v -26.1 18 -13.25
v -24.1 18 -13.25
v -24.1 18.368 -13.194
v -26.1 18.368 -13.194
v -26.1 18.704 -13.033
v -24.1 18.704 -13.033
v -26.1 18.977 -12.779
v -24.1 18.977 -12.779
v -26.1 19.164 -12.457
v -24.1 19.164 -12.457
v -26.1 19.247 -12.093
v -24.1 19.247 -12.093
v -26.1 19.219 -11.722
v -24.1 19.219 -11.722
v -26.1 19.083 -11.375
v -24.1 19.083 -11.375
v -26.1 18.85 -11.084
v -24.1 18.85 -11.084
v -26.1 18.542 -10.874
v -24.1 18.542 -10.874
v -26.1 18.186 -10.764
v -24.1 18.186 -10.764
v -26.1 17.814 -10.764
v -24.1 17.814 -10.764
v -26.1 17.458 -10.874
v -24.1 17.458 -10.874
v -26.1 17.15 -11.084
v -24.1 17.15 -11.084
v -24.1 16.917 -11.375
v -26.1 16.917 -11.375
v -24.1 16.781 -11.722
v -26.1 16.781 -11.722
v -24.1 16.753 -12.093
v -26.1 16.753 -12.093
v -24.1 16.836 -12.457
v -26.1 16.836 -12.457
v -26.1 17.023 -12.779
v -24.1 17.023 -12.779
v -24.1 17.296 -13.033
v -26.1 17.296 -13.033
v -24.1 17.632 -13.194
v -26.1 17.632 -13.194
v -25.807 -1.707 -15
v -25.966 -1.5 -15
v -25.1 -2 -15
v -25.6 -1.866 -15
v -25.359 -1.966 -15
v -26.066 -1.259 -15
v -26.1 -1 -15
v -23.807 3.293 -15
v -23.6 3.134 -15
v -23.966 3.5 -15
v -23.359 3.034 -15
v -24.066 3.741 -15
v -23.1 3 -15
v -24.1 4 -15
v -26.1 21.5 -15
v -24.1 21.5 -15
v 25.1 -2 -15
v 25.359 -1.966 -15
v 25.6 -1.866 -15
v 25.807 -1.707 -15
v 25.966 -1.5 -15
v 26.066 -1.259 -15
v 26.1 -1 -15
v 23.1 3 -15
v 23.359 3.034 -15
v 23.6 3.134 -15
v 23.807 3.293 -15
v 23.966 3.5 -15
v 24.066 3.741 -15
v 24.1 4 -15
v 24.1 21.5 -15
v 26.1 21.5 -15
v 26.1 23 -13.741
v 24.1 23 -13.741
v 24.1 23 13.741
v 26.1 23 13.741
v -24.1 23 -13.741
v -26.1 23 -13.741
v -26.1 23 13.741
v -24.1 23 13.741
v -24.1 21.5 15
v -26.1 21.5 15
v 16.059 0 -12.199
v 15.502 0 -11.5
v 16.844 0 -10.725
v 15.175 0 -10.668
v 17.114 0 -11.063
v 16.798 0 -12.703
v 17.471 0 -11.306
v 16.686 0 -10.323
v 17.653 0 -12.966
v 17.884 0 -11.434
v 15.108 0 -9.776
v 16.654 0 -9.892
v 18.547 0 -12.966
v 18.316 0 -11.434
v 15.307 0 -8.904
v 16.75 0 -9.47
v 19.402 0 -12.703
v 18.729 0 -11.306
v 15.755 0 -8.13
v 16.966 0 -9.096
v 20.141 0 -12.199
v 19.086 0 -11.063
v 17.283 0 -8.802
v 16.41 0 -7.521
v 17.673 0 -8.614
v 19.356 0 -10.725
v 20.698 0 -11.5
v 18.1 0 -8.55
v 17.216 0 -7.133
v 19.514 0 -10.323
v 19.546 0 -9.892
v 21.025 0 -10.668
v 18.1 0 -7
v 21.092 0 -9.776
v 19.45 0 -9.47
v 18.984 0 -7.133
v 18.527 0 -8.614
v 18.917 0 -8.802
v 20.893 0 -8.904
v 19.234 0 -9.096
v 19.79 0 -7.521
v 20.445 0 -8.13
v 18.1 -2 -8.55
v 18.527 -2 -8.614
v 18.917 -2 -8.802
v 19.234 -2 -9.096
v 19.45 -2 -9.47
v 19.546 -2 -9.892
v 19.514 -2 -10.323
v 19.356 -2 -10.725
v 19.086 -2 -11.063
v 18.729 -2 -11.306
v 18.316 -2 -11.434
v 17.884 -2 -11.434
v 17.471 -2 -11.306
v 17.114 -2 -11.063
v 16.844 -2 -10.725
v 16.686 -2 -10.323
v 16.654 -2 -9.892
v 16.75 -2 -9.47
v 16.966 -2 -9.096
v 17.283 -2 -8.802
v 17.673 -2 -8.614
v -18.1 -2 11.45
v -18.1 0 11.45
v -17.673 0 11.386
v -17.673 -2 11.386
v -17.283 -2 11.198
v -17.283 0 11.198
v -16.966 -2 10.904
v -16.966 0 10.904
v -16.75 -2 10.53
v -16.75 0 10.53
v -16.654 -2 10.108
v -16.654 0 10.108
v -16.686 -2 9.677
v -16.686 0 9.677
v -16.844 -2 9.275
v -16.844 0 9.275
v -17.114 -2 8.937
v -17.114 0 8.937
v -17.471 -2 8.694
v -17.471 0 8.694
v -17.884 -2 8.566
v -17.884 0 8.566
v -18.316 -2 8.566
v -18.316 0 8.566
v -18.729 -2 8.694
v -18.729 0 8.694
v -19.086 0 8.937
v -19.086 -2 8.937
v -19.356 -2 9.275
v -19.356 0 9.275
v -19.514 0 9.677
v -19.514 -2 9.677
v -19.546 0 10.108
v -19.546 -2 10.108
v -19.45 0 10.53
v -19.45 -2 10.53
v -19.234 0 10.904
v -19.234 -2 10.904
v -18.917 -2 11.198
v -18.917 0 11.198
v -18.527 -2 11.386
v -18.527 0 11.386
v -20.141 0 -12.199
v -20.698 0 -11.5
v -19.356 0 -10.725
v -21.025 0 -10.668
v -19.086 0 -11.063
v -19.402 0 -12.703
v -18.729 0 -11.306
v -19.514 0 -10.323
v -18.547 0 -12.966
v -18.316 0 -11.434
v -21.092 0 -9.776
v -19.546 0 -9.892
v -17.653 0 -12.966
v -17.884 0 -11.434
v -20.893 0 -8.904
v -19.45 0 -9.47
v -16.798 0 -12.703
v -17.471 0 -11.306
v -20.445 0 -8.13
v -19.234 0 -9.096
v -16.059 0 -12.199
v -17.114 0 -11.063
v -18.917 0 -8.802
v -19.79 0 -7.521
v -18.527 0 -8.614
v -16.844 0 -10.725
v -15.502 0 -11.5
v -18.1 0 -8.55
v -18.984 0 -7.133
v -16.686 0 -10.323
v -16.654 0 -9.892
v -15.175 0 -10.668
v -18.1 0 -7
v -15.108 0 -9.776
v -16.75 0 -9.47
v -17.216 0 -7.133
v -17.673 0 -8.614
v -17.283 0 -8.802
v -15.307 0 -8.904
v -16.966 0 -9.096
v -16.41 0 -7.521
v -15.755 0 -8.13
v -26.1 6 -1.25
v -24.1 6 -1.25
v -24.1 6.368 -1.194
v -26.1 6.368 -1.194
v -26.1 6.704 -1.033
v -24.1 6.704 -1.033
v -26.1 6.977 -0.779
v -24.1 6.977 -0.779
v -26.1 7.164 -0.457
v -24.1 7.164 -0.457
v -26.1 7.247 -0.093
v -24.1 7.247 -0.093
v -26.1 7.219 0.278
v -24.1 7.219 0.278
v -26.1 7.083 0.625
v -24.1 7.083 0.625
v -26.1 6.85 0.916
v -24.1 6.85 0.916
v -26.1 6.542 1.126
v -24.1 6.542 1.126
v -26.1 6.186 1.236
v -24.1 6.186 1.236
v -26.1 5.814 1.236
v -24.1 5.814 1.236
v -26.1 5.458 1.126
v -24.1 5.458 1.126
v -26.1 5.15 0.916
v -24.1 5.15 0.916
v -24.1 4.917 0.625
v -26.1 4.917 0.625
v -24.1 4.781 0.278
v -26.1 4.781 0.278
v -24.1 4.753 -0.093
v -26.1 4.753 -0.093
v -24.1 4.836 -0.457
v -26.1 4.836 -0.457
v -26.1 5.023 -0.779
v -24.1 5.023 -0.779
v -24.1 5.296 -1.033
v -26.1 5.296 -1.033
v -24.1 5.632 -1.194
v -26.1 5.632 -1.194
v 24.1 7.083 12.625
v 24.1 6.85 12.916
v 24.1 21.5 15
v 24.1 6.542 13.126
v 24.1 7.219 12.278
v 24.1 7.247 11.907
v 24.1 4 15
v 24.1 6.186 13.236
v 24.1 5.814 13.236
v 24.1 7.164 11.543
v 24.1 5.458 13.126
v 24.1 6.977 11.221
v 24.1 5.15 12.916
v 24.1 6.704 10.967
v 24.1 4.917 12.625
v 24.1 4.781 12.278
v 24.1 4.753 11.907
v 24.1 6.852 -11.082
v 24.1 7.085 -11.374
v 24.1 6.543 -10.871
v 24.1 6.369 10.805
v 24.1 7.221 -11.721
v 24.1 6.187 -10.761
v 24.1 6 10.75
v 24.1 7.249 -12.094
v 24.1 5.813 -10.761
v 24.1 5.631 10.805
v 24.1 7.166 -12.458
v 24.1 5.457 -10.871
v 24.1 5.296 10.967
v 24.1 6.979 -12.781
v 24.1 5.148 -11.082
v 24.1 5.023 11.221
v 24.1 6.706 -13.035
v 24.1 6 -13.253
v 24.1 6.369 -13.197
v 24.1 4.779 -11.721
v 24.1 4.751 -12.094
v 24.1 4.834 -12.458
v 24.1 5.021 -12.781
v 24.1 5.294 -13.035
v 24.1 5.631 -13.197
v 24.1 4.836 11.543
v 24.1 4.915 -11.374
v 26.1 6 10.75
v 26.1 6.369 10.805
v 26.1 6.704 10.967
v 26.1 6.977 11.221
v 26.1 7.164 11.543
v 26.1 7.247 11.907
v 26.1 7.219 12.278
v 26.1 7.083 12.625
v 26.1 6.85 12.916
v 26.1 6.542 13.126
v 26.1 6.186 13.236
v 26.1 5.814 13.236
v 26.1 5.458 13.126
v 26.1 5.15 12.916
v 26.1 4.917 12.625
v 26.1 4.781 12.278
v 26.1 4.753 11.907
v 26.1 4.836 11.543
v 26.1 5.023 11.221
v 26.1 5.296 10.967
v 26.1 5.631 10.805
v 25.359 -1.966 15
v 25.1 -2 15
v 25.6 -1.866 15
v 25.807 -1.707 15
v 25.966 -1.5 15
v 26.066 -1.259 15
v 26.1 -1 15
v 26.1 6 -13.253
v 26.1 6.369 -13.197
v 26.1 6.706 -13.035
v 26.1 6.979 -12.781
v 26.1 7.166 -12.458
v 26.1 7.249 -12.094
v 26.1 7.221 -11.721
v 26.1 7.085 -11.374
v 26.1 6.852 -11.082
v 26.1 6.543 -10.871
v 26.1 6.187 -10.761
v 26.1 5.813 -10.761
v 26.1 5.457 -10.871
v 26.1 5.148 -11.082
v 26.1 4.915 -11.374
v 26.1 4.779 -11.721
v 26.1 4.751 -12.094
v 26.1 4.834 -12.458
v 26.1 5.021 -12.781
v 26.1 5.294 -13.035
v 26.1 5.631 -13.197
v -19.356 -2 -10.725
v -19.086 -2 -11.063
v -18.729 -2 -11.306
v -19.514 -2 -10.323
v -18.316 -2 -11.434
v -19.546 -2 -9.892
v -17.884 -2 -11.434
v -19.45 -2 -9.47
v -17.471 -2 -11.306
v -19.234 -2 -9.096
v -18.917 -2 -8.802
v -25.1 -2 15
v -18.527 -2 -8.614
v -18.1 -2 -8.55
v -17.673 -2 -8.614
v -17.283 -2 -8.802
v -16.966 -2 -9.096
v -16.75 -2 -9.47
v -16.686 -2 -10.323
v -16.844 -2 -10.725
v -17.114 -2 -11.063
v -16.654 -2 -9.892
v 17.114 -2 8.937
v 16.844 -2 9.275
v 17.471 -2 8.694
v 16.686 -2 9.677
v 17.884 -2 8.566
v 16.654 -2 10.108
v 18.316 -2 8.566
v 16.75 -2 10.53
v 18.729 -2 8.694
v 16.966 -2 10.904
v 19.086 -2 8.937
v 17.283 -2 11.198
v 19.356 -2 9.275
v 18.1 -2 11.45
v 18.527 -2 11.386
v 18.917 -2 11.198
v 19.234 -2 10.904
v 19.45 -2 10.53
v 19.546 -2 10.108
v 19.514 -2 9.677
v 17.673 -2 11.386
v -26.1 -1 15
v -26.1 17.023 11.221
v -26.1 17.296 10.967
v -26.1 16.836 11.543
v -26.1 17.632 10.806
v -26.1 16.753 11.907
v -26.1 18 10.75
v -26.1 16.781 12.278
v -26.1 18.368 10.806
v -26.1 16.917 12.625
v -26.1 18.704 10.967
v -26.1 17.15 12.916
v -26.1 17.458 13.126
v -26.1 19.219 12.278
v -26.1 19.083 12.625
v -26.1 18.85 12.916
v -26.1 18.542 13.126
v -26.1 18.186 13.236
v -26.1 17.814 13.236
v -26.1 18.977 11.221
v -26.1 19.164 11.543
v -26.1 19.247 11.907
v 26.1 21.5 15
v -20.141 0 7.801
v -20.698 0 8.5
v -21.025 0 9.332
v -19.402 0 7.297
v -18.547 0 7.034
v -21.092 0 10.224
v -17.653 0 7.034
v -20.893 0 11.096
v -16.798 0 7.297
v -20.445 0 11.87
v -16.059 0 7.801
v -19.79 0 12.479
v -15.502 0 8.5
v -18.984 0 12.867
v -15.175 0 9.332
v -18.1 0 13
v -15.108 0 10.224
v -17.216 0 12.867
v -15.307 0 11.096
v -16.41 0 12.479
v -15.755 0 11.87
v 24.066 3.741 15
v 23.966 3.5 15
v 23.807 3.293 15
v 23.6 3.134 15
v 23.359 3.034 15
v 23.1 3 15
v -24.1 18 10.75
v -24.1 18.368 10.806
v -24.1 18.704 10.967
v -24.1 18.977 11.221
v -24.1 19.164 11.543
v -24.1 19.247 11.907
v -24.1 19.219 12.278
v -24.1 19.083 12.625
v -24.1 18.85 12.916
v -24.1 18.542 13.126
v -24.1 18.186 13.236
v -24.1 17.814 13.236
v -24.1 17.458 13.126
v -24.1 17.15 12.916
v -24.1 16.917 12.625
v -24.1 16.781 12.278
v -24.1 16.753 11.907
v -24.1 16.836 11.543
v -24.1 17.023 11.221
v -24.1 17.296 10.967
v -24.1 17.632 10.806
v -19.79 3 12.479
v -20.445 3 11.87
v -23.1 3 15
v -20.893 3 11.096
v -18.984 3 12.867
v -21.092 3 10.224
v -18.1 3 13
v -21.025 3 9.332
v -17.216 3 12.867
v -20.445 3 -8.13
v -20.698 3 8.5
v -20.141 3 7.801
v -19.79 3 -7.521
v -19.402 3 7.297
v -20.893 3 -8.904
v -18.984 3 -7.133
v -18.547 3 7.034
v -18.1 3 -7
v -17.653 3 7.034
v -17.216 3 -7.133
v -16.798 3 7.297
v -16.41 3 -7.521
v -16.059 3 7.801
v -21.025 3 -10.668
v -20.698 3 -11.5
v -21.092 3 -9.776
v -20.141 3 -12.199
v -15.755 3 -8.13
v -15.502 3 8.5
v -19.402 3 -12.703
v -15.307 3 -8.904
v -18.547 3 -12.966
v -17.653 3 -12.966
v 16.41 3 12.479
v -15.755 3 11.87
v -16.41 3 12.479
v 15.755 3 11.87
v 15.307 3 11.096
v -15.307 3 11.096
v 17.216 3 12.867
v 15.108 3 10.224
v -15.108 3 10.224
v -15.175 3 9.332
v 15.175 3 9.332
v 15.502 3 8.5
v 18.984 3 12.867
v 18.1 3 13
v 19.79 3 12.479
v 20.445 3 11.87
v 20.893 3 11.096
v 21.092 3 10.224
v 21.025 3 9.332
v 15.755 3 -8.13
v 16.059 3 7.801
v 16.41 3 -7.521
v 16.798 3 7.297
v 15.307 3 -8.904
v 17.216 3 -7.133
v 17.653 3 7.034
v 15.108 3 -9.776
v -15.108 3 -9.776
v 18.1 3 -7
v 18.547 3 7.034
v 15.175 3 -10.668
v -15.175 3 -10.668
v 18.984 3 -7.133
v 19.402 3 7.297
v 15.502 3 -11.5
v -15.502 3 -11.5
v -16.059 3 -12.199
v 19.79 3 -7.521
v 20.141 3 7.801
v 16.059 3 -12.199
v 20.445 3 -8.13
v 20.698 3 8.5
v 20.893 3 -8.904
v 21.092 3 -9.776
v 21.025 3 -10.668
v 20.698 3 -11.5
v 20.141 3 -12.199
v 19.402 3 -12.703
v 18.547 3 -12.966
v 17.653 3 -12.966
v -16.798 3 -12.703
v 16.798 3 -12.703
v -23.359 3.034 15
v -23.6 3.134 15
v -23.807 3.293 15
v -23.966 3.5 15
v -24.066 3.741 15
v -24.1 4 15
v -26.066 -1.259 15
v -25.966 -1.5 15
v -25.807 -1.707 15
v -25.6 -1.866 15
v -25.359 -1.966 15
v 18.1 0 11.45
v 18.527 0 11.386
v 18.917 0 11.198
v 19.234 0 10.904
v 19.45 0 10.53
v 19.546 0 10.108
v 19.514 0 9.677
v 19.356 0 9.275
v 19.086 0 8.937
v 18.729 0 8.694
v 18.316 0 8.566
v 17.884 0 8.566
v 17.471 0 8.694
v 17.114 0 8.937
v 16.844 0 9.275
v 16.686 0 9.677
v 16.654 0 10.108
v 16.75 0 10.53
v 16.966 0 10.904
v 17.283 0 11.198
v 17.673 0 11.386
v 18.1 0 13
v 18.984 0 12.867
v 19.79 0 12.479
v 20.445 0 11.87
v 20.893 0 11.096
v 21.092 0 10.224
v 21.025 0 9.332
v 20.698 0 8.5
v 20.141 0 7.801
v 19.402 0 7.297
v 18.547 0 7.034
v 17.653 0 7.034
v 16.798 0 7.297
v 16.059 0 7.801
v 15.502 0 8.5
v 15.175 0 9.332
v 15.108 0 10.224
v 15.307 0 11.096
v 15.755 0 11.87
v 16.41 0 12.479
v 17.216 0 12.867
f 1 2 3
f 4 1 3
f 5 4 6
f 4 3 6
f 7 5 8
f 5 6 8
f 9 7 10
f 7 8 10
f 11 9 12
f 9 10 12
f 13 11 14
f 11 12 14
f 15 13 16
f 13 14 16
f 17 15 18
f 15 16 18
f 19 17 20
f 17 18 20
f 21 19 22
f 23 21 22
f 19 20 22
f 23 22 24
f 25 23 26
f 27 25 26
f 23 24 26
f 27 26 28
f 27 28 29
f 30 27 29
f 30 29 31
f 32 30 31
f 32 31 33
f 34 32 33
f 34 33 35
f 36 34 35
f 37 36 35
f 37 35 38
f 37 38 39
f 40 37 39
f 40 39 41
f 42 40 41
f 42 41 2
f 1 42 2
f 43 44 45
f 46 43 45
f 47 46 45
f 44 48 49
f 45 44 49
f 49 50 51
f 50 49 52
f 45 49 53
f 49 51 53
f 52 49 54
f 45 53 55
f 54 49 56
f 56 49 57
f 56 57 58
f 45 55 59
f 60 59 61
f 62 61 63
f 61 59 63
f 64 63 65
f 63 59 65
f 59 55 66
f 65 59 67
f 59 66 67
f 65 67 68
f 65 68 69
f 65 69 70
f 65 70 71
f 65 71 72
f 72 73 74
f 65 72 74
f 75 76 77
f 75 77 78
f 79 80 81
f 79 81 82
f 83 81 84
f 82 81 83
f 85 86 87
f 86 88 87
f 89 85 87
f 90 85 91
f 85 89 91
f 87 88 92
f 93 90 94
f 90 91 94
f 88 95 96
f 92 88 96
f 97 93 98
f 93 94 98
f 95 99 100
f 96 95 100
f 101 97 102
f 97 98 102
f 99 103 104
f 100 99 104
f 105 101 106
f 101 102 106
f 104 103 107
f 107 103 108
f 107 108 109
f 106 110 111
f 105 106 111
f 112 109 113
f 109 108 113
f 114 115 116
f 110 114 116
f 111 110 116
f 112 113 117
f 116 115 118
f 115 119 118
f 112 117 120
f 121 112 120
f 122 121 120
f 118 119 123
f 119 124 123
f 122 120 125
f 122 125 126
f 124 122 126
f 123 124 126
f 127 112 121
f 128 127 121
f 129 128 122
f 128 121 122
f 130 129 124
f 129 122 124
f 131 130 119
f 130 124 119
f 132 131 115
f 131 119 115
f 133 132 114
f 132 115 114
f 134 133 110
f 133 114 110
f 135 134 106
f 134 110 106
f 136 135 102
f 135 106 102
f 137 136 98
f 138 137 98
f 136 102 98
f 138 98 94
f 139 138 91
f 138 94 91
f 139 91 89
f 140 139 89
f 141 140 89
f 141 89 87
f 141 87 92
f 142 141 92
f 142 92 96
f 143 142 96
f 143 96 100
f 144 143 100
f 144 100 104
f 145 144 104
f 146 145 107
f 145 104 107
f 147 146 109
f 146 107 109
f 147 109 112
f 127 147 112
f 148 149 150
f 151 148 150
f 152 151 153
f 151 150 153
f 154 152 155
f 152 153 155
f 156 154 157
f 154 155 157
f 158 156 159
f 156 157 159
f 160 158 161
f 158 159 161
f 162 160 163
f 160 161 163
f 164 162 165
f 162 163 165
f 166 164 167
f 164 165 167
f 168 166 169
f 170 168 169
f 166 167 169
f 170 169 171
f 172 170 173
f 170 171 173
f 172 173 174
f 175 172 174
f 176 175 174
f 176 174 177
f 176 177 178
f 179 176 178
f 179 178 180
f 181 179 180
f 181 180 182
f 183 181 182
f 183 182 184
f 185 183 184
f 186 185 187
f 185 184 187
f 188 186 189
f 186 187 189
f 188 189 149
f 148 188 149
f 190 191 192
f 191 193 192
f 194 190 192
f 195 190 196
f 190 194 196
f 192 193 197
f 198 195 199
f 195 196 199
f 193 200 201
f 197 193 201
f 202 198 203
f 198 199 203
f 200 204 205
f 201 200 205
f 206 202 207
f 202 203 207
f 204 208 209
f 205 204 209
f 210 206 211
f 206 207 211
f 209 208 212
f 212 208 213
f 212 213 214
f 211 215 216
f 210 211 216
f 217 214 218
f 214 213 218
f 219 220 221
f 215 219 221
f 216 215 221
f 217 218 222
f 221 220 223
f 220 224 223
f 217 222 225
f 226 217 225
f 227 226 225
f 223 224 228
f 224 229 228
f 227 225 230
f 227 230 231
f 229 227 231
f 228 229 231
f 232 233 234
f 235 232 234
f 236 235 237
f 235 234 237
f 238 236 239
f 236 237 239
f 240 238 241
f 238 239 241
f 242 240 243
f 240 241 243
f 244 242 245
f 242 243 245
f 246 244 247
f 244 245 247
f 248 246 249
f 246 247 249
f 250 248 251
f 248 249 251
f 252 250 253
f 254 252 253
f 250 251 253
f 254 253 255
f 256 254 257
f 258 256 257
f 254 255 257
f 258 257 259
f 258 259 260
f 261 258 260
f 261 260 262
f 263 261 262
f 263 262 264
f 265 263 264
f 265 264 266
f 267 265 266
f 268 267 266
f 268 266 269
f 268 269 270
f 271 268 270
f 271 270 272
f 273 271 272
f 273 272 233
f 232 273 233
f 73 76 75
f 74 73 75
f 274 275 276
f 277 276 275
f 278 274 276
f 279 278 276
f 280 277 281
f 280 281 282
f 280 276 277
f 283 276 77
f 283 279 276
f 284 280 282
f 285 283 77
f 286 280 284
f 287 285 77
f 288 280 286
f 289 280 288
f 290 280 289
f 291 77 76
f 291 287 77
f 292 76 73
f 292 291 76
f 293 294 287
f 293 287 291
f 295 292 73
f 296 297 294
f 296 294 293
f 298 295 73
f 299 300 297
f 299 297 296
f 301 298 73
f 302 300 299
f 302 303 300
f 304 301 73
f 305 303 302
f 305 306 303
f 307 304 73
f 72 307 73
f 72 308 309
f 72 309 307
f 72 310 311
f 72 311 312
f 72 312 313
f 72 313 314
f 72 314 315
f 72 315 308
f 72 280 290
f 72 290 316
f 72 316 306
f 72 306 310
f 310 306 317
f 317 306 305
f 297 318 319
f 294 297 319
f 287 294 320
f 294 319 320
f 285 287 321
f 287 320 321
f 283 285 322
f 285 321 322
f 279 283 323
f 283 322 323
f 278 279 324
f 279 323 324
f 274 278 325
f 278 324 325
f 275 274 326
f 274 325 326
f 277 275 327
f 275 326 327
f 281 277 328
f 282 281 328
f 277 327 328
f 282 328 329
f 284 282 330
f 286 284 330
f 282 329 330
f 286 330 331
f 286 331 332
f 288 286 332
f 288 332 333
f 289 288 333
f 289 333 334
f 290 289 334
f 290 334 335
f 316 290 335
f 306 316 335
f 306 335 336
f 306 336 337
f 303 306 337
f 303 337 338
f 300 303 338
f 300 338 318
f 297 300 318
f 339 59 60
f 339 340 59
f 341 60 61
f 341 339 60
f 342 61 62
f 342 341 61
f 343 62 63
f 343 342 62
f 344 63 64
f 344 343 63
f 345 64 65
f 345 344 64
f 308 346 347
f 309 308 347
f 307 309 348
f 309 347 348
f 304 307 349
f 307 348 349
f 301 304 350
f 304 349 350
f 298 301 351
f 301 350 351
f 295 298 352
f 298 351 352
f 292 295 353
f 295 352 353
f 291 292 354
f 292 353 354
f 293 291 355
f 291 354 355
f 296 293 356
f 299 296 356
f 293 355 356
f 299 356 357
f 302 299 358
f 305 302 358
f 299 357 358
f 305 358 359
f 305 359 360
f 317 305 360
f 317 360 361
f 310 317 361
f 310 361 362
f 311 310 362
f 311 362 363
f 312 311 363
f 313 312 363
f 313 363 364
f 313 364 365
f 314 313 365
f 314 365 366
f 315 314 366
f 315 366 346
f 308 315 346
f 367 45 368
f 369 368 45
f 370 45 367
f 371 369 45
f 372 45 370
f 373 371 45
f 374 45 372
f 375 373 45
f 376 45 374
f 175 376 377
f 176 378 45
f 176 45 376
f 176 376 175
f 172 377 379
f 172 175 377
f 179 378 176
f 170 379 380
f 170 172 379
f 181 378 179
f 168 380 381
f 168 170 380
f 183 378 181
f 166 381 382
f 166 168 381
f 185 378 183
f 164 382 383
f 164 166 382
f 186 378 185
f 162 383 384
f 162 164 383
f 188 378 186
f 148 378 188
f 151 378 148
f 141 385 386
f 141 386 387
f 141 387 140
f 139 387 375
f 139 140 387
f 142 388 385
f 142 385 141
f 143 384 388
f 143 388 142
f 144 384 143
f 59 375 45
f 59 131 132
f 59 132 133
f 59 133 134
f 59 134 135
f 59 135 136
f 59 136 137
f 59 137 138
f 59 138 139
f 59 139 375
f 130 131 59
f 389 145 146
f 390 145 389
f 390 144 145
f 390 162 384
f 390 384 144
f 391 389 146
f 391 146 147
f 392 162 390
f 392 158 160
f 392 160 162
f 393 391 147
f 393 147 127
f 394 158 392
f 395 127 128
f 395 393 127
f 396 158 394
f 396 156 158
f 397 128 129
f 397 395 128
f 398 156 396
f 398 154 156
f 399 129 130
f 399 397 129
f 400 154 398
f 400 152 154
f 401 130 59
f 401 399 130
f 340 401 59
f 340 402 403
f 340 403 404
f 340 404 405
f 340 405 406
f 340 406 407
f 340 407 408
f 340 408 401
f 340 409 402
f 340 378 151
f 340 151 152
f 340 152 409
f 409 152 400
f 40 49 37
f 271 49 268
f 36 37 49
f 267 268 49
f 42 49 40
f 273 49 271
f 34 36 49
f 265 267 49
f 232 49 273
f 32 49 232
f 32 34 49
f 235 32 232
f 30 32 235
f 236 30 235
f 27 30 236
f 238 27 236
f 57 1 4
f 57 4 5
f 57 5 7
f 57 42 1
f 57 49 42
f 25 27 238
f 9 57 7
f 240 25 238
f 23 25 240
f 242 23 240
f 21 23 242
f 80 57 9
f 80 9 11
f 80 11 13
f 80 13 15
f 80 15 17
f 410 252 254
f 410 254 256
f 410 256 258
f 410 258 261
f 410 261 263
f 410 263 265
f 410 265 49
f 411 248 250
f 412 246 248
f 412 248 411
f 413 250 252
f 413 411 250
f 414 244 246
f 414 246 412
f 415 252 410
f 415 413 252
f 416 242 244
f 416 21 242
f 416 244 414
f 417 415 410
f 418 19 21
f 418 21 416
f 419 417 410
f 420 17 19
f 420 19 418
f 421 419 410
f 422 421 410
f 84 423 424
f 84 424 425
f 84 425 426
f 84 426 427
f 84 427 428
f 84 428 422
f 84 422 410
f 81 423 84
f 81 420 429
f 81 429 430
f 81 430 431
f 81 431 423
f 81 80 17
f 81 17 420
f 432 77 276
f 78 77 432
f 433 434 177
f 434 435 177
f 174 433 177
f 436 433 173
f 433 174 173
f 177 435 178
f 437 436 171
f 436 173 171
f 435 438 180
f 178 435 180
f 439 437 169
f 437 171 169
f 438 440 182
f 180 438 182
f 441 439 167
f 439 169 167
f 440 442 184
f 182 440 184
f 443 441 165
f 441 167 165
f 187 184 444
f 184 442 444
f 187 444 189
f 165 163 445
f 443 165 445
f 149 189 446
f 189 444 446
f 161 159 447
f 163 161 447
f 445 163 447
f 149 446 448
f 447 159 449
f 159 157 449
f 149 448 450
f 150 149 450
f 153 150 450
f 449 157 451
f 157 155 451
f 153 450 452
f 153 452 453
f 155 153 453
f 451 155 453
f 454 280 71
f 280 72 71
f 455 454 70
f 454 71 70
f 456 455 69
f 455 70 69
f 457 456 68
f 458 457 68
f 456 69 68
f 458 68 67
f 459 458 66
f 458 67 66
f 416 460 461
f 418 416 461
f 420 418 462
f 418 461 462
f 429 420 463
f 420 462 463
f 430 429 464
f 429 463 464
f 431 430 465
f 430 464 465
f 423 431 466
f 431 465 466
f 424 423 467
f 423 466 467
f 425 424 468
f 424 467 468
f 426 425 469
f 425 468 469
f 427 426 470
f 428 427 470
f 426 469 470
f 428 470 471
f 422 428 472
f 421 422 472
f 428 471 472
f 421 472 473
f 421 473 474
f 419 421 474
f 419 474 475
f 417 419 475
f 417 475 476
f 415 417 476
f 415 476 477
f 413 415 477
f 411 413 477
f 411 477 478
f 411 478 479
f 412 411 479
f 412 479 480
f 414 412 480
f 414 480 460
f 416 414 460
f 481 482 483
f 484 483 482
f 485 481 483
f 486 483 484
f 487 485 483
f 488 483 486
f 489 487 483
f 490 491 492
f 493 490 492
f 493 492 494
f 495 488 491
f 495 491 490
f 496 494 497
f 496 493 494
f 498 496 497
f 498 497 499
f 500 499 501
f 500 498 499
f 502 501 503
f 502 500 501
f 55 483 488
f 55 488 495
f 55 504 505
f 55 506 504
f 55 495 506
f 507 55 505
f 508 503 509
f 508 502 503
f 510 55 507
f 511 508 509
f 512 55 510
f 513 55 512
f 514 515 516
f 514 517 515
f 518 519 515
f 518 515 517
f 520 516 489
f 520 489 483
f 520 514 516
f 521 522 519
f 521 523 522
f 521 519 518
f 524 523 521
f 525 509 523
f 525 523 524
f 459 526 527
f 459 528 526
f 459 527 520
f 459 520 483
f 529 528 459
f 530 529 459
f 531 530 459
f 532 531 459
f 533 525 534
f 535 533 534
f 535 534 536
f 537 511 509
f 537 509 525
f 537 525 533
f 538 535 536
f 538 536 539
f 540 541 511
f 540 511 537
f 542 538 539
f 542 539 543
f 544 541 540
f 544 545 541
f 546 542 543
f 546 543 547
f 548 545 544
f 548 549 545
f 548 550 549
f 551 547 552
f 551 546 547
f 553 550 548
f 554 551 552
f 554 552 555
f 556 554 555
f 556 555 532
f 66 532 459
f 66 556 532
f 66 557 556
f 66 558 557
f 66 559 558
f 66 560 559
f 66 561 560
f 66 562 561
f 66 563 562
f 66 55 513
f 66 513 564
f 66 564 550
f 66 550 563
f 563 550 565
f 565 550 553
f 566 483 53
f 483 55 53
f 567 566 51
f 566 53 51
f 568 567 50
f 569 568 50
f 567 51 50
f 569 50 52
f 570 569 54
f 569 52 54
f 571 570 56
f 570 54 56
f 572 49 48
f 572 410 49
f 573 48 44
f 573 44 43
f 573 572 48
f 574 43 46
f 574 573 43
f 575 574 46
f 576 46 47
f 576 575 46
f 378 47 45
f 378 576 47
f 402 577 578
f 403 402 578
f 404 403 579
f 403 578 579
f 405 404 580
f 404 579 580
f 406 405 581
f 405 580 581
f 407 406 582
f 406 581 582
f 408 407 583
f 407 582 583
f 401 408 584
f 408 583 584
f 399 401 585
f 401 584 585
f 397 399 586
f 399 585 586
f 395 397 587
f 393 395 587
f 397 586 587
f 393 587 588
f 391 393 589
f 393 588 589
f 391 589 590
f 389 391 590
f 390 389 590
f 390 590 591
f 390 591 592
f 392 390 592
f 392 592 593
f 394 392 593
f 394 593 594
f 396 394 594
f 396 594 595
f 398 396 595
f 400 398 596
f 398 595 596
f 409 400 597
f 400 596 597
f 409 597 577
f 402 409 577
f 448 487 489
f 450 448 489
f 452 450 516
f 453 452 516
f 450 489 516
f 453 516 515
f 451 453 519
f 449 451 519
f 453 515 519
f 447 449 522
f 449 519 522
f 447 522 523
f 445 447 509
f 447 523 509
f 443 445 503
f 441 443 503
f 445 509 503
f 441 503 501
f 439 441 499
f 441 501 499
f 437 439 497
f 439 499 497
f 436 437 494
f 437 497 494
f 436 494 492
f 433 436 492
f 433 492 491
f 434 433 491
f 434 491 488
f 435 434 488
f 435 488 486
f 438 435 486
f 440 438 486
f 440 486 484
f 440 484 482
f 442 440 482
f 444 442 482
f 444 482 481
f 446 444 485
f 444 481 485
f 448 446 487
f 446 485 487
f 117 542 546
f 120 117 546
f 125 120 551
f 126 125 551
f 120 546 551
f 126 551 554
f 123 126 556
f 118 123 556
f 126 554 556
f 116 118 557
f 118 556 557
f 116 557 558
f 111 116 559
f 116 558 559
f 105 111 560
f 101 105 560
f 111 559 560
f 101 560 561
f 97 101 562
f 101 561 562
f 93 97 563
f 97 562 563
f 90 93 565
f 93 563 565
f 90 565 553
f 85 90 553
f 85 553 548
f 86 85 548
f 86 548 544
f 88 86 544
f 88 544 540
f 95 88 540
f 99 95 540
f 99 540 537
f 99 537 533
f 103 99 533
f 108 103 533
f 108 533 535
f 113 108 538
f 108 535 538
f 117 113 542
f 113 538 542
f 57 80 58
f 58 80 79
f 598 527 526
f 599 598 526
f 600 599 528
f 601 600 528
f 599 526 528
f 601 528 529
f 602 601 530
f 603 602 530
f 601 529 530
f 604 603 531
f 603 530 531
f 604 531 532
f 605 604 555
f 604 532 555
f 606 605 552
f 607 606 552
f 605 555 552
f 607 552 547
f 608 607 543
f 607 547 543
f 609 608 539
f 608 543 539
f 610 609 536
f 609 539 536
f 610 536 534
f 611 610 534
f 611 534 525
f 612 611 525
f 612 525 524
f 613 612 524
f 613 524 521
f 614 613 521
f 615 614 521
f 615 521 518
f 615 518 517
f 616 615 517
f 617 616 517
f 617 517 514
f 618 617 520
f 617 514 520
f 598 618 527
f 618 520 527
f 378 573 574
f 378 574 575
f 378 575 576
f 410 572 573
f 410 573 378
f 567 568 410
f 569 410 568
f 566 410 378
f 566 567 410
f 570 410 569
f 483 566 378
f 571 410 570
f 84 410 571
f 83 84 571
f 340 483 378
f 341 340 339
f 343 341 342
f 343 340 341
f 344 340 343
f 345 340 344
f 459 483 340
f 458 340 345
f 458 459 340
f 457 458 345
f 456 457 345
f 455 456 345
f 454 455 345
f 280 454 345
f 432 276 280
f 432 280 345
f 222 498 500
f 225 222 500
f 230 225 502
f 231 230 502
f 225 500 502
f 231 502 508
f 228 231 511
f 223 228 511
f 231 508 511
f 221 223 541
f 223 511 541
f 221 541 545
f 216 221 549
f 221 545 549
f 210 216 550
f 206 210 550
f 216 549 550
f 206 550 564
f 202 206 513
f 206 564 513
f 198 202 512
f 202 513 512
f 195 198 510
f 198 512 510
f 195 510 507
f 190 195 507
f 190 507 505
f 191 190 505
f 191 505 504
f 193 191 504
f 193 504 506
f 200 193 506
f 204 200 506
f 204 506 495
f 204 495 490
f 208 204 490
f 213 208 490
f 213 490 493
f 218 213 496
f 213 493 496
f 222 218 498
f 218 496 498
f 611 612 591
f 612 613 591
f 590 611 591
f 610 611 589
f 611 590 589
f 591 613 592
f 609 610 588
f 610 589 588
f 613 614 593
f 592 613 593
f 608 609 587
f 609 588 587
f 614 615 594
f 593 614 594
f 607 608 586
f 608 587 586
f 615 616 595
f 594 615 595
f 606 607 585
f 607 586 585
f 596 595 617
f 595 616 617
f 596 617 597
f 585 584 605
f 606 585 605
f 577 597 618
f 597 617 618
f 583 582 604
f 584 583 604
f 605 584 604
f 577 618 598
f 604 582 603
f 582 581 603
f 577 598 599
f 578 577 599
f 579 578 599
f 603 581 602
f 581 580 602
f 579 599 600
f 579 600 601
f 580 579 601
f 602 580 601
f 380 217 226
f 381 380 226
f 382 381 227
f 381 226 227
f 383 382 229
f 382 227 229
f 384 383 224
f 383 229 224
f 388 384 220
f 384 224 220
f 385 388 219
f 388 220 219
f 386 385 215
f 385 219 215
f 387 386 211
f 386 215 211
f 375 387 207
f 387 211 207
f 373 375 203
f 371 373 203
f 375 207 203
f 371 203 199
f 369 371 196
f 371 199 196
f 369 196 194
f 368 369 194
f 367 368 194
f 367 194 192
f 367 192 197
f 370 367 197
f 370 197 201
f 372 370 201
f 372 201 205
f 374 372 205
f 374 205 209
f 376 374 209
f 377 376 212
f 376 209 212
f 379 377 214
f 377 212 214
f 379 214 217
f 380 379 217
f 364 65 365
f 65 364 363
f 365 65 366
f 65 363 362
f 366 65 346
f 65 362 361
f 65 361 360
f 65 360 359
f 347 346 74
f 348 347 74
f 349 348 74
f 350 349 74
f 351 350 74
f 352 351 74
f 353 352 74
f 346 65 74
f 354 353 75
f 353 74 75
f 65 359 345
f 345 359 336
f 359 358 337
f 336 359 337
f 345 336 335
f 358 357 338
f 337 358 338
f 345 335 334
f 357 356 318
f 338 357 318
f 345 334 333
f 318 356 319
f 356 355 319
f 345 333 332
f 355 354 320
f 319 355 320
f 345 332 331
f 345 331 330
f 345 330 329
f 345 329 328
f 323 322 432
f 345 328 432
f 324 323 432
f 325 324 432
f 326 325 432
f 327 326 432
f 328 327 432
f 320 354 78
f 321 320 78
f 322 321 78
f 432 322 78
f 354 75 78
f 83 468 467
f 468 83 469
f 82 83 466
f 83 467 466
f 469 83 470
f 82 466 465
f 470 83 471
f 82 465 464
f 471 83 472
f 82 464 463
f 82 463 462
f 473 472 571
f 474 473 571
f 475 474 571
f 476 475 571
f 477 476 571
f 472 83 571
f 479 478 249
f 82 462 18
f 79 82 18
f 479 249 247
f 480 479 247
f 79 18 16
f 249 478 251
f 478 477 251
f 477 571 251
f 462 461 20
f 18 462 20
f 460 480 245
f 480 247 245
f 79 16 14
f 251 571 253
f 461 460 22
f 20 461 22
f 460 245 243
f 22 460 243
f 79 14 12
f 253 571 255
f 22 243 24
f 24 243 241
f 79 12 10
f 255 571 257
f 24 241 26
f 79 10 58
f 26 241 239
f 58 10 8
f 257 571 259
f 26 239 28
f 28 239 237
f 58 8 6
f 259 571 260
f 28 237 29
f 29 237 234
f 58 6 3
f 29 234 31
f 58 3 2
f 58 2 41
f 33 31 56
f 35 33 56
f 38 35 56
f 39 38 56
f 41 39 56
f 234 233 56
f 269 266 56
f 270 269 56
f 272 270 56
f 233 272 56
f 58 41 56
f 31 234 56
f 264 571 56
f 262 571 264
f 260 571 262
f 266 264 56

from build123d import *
from OCP.BRepFilletAPI import BRepFilletAPI_MakeChamfer

# Parameters (mm, degrees)
SKETCH1_W           = 52.2
SKETCH1_H           = 30
BOSS_EXTRUDE1_DEPTH = 3
SKETCH2_W           = 2
SKETCH2_H           = 30
BOSS_EXTRUDE2_DEPTH = 20
SKETCH3_W           = 2
SKETCH3_H           = 30
BOSS_EXTRUDE3_DEPTH = 20
SKETCH4_R           = 1.252611376
SKETCH4_R_2         = 1.250208487
CUT_EXTRUDE2_DEPTH  = 5
SKETCH5_R           = 1.25
SKETCH5_R_2         = 1.249999994
CUT_EXTRUDE4_DEPTH  = 5
SKETCH6_R           = 3
CUT_EXTRUDE5_DEPTH  = 3
SKETCH7_W           = 52.2
SKETCH7_H           = 30
BOSS_EXTRUDE4_DEPTH = 2
SKETCH8_R           = 1.45
CUT_EXTRUDE6_DEPTH  = 2
FILLET1_R           = 1
CHAMFER2_SIZE       = 1.5
CHAMFER2_SIZE2      = 1.258649447


with BuildPart() as part:
    # Sketch1 → Boss-Extrude1 (new body)
    with BuildSketch(Plane(origin=(0, 0, 0), x_dir=(1, 0, 0), z_dir=(0, 1, 0))):
        Rectangle(SKETCH1_W, SKETCH1_H)
    extrude(amount=BOSS_EXTRUDE1_DEPTH)

    # Sketch2 → Boss-Extrude2 (add)
    with BuildSketch(Plane(origin=(0, 3, 0), x_dir=(1, 0, 0), z_dir=(0, 1, 0))):
        with Locations((-25.1, 0)):
            Rectangle(SKETCH2_W, SKETCH2_H)
    extrude(amount=BOSS_EXTRUDE2_DEPTH)

    # Sketch3 → Boss-Extrude3 (add)
    with BuildSketch(Plane(origin=(0, 3, 0), x_dir=(1, 0, 0), z_dir=(0, 1, 0))):
        with Locations((25.1, 0)):
            Rectangle(SKETCH3_W, SKETCH3_H)
    extrude(amount=BOSS_EXTRUDE3_DEPTH)

    # Sketch4 → Cut-Extrude2 (cut)
    with BuildSketch(Plane(origin=(26.1, 0, 0), x_dir=(0, 0, -1), z_dir=(1, 0, 0))):
        with Locations((12, 6)):
            Circle(SKETCH4_R)
        with Locations((-12, 6)):
            Circle(SKETCH4_R_2)
    extrude(amount=-CUT_EXTRUDE2_DEPTH, mode=Mode.SUBTRACT)

    # Sketch5 → Cut-Extrude4 (cut)
    with BuildSketch(Plane(origin=(-24.1, 0, 0), x_dir=(0, 0, -1), z_dir=(1, 0, 0))):
        with Locations((-12.00000002, 18)):
            Circle(SKETCH5_R)
        with Locations((12.00000002, 18)):
            Circle(SKETCH5_R)
        with Locations((0, 6)):
            Circle(SKETCH5_R_2)
    extrude(amount=-CUT_EXTRUDE4_DEPTH, mode=Mode.SUBTRACT)

    # Sketch6 → Cut-Extrude5 (cut)
    with BuildSketch(Plane(origin=(0, 3, 0), x_dir=(1, 0, 0), z_dir=(0, 1, 0))):
        with Locations(Location((-18.1, 10, 0), (0, 0, 270))):
            Circle(SKETCH6_R)
        with Locations(Location((-18.1, -10, 0), (0, 0, 270))):
            Circle(SKETCH6_R)
        with Locations(Location((18.1, 10, 0), (0, 0, 270))):
            Circle(SKETCH6_R)
        with Locations(Location((18.1, -10, 0), (0, 0, 270))):
            Circle(SKETCH6_R)
    extrude(amount=-CUT_EXTRUDE5_DEPTH, mode=Mode.SUBTRACT)

    # Sketch7 → Boss-Extrude4 (add)
    with BuildSketch(Plane.XZ):
        Rectangle(SKETCH7_W, SKETCH7_H)
    extrude(amount=BOSS_EXTRUDE4_DEPTH)

    # Sketch8 → Cut-Extrude6 (cut)
    with BuildSketch(Plane(origin=(0, 0, 0), x_dir=(1, 0, 0), z_dir=(0, 1, 0))):
        with Locations(Location((-18.1, 10, 0), (0, 0, 270))):
            Circle(SKETCH8_R)
        with Locations(Location((18.1, 10, 0), (0, 0, 270))):
            Circle(SKETCH8_R)
        with Locations(Location((18.1, -10, 0), (0, 0, 270))):
            Circle(SKETCH8_R)
        with Locations(Location((-18.1, -10, 0), (0, 0, 270))):
            Circle(SKETCH8_R)
    extrude(amount=-CUT_EXTRUDE6_DEPTH, mode=Mode.SUBTRACT)

    # Fillet1
    fillet1_edges = [part.edges().sort_by_distance(p)[0] for p in [
        (-24.1, 3, 0),
        (24.1, 3, 0),
        (-26.1, -2, 0),
        (26.1, -2, 0),
    ]]
    fillet(fillet1_edges, radius=FILLET1_R)

    # Chamfer2: one chamfer whose edges measure the first distance from different faces: ONE call of the kernel's chamfer builder (chamfer() names one face for all edges)
    chamfer2_edges_1 = [part.edges().sort_by_distance(p)[0] for p in [
        (-25.1, 23, 15),
        (25.1, 23, 15),
    ]]
    chamfer2_side_1 = [part.faces().sort_by_distance(p)[0] for p in [
        (-25.521221977, 11, 15),
    ]]
    chamfer2_edges_2 = [part.edges().sort_by_distance(p)[0] for p in [
        (-25.1, 23, -15),
        (25.1, 23, -15),
    ]]
    chamfer2_side_2 = [part.faces().sort_by_distance(p)[0] for p in [
        (24.678778023, 13.5, -15),
    ]]
    chamfer2 = BRepFilletAPI_MakeChamfer(part.part.solid().wrapped)
    for e in chamfer2_edges_1:
        chamfer2.Add(CHAMFER2_SIZE, CHAMFER2_SIZE2, e.wrapped, chamfer2_side_1[0].wrapped)  # the first distance lies on this face
    for e in chamfer2_edges_2:
        chamfer2.Add(CHAMFER2_SIZE, CHAMFER2_SIZE2, e.wrapped, chamfer2_side_2[0].wrapped)  # the first distance lies on this face
    add(Compound.cast(chamfer2.Shape()), mode=Mode.REPLACE)


solid = part.part
